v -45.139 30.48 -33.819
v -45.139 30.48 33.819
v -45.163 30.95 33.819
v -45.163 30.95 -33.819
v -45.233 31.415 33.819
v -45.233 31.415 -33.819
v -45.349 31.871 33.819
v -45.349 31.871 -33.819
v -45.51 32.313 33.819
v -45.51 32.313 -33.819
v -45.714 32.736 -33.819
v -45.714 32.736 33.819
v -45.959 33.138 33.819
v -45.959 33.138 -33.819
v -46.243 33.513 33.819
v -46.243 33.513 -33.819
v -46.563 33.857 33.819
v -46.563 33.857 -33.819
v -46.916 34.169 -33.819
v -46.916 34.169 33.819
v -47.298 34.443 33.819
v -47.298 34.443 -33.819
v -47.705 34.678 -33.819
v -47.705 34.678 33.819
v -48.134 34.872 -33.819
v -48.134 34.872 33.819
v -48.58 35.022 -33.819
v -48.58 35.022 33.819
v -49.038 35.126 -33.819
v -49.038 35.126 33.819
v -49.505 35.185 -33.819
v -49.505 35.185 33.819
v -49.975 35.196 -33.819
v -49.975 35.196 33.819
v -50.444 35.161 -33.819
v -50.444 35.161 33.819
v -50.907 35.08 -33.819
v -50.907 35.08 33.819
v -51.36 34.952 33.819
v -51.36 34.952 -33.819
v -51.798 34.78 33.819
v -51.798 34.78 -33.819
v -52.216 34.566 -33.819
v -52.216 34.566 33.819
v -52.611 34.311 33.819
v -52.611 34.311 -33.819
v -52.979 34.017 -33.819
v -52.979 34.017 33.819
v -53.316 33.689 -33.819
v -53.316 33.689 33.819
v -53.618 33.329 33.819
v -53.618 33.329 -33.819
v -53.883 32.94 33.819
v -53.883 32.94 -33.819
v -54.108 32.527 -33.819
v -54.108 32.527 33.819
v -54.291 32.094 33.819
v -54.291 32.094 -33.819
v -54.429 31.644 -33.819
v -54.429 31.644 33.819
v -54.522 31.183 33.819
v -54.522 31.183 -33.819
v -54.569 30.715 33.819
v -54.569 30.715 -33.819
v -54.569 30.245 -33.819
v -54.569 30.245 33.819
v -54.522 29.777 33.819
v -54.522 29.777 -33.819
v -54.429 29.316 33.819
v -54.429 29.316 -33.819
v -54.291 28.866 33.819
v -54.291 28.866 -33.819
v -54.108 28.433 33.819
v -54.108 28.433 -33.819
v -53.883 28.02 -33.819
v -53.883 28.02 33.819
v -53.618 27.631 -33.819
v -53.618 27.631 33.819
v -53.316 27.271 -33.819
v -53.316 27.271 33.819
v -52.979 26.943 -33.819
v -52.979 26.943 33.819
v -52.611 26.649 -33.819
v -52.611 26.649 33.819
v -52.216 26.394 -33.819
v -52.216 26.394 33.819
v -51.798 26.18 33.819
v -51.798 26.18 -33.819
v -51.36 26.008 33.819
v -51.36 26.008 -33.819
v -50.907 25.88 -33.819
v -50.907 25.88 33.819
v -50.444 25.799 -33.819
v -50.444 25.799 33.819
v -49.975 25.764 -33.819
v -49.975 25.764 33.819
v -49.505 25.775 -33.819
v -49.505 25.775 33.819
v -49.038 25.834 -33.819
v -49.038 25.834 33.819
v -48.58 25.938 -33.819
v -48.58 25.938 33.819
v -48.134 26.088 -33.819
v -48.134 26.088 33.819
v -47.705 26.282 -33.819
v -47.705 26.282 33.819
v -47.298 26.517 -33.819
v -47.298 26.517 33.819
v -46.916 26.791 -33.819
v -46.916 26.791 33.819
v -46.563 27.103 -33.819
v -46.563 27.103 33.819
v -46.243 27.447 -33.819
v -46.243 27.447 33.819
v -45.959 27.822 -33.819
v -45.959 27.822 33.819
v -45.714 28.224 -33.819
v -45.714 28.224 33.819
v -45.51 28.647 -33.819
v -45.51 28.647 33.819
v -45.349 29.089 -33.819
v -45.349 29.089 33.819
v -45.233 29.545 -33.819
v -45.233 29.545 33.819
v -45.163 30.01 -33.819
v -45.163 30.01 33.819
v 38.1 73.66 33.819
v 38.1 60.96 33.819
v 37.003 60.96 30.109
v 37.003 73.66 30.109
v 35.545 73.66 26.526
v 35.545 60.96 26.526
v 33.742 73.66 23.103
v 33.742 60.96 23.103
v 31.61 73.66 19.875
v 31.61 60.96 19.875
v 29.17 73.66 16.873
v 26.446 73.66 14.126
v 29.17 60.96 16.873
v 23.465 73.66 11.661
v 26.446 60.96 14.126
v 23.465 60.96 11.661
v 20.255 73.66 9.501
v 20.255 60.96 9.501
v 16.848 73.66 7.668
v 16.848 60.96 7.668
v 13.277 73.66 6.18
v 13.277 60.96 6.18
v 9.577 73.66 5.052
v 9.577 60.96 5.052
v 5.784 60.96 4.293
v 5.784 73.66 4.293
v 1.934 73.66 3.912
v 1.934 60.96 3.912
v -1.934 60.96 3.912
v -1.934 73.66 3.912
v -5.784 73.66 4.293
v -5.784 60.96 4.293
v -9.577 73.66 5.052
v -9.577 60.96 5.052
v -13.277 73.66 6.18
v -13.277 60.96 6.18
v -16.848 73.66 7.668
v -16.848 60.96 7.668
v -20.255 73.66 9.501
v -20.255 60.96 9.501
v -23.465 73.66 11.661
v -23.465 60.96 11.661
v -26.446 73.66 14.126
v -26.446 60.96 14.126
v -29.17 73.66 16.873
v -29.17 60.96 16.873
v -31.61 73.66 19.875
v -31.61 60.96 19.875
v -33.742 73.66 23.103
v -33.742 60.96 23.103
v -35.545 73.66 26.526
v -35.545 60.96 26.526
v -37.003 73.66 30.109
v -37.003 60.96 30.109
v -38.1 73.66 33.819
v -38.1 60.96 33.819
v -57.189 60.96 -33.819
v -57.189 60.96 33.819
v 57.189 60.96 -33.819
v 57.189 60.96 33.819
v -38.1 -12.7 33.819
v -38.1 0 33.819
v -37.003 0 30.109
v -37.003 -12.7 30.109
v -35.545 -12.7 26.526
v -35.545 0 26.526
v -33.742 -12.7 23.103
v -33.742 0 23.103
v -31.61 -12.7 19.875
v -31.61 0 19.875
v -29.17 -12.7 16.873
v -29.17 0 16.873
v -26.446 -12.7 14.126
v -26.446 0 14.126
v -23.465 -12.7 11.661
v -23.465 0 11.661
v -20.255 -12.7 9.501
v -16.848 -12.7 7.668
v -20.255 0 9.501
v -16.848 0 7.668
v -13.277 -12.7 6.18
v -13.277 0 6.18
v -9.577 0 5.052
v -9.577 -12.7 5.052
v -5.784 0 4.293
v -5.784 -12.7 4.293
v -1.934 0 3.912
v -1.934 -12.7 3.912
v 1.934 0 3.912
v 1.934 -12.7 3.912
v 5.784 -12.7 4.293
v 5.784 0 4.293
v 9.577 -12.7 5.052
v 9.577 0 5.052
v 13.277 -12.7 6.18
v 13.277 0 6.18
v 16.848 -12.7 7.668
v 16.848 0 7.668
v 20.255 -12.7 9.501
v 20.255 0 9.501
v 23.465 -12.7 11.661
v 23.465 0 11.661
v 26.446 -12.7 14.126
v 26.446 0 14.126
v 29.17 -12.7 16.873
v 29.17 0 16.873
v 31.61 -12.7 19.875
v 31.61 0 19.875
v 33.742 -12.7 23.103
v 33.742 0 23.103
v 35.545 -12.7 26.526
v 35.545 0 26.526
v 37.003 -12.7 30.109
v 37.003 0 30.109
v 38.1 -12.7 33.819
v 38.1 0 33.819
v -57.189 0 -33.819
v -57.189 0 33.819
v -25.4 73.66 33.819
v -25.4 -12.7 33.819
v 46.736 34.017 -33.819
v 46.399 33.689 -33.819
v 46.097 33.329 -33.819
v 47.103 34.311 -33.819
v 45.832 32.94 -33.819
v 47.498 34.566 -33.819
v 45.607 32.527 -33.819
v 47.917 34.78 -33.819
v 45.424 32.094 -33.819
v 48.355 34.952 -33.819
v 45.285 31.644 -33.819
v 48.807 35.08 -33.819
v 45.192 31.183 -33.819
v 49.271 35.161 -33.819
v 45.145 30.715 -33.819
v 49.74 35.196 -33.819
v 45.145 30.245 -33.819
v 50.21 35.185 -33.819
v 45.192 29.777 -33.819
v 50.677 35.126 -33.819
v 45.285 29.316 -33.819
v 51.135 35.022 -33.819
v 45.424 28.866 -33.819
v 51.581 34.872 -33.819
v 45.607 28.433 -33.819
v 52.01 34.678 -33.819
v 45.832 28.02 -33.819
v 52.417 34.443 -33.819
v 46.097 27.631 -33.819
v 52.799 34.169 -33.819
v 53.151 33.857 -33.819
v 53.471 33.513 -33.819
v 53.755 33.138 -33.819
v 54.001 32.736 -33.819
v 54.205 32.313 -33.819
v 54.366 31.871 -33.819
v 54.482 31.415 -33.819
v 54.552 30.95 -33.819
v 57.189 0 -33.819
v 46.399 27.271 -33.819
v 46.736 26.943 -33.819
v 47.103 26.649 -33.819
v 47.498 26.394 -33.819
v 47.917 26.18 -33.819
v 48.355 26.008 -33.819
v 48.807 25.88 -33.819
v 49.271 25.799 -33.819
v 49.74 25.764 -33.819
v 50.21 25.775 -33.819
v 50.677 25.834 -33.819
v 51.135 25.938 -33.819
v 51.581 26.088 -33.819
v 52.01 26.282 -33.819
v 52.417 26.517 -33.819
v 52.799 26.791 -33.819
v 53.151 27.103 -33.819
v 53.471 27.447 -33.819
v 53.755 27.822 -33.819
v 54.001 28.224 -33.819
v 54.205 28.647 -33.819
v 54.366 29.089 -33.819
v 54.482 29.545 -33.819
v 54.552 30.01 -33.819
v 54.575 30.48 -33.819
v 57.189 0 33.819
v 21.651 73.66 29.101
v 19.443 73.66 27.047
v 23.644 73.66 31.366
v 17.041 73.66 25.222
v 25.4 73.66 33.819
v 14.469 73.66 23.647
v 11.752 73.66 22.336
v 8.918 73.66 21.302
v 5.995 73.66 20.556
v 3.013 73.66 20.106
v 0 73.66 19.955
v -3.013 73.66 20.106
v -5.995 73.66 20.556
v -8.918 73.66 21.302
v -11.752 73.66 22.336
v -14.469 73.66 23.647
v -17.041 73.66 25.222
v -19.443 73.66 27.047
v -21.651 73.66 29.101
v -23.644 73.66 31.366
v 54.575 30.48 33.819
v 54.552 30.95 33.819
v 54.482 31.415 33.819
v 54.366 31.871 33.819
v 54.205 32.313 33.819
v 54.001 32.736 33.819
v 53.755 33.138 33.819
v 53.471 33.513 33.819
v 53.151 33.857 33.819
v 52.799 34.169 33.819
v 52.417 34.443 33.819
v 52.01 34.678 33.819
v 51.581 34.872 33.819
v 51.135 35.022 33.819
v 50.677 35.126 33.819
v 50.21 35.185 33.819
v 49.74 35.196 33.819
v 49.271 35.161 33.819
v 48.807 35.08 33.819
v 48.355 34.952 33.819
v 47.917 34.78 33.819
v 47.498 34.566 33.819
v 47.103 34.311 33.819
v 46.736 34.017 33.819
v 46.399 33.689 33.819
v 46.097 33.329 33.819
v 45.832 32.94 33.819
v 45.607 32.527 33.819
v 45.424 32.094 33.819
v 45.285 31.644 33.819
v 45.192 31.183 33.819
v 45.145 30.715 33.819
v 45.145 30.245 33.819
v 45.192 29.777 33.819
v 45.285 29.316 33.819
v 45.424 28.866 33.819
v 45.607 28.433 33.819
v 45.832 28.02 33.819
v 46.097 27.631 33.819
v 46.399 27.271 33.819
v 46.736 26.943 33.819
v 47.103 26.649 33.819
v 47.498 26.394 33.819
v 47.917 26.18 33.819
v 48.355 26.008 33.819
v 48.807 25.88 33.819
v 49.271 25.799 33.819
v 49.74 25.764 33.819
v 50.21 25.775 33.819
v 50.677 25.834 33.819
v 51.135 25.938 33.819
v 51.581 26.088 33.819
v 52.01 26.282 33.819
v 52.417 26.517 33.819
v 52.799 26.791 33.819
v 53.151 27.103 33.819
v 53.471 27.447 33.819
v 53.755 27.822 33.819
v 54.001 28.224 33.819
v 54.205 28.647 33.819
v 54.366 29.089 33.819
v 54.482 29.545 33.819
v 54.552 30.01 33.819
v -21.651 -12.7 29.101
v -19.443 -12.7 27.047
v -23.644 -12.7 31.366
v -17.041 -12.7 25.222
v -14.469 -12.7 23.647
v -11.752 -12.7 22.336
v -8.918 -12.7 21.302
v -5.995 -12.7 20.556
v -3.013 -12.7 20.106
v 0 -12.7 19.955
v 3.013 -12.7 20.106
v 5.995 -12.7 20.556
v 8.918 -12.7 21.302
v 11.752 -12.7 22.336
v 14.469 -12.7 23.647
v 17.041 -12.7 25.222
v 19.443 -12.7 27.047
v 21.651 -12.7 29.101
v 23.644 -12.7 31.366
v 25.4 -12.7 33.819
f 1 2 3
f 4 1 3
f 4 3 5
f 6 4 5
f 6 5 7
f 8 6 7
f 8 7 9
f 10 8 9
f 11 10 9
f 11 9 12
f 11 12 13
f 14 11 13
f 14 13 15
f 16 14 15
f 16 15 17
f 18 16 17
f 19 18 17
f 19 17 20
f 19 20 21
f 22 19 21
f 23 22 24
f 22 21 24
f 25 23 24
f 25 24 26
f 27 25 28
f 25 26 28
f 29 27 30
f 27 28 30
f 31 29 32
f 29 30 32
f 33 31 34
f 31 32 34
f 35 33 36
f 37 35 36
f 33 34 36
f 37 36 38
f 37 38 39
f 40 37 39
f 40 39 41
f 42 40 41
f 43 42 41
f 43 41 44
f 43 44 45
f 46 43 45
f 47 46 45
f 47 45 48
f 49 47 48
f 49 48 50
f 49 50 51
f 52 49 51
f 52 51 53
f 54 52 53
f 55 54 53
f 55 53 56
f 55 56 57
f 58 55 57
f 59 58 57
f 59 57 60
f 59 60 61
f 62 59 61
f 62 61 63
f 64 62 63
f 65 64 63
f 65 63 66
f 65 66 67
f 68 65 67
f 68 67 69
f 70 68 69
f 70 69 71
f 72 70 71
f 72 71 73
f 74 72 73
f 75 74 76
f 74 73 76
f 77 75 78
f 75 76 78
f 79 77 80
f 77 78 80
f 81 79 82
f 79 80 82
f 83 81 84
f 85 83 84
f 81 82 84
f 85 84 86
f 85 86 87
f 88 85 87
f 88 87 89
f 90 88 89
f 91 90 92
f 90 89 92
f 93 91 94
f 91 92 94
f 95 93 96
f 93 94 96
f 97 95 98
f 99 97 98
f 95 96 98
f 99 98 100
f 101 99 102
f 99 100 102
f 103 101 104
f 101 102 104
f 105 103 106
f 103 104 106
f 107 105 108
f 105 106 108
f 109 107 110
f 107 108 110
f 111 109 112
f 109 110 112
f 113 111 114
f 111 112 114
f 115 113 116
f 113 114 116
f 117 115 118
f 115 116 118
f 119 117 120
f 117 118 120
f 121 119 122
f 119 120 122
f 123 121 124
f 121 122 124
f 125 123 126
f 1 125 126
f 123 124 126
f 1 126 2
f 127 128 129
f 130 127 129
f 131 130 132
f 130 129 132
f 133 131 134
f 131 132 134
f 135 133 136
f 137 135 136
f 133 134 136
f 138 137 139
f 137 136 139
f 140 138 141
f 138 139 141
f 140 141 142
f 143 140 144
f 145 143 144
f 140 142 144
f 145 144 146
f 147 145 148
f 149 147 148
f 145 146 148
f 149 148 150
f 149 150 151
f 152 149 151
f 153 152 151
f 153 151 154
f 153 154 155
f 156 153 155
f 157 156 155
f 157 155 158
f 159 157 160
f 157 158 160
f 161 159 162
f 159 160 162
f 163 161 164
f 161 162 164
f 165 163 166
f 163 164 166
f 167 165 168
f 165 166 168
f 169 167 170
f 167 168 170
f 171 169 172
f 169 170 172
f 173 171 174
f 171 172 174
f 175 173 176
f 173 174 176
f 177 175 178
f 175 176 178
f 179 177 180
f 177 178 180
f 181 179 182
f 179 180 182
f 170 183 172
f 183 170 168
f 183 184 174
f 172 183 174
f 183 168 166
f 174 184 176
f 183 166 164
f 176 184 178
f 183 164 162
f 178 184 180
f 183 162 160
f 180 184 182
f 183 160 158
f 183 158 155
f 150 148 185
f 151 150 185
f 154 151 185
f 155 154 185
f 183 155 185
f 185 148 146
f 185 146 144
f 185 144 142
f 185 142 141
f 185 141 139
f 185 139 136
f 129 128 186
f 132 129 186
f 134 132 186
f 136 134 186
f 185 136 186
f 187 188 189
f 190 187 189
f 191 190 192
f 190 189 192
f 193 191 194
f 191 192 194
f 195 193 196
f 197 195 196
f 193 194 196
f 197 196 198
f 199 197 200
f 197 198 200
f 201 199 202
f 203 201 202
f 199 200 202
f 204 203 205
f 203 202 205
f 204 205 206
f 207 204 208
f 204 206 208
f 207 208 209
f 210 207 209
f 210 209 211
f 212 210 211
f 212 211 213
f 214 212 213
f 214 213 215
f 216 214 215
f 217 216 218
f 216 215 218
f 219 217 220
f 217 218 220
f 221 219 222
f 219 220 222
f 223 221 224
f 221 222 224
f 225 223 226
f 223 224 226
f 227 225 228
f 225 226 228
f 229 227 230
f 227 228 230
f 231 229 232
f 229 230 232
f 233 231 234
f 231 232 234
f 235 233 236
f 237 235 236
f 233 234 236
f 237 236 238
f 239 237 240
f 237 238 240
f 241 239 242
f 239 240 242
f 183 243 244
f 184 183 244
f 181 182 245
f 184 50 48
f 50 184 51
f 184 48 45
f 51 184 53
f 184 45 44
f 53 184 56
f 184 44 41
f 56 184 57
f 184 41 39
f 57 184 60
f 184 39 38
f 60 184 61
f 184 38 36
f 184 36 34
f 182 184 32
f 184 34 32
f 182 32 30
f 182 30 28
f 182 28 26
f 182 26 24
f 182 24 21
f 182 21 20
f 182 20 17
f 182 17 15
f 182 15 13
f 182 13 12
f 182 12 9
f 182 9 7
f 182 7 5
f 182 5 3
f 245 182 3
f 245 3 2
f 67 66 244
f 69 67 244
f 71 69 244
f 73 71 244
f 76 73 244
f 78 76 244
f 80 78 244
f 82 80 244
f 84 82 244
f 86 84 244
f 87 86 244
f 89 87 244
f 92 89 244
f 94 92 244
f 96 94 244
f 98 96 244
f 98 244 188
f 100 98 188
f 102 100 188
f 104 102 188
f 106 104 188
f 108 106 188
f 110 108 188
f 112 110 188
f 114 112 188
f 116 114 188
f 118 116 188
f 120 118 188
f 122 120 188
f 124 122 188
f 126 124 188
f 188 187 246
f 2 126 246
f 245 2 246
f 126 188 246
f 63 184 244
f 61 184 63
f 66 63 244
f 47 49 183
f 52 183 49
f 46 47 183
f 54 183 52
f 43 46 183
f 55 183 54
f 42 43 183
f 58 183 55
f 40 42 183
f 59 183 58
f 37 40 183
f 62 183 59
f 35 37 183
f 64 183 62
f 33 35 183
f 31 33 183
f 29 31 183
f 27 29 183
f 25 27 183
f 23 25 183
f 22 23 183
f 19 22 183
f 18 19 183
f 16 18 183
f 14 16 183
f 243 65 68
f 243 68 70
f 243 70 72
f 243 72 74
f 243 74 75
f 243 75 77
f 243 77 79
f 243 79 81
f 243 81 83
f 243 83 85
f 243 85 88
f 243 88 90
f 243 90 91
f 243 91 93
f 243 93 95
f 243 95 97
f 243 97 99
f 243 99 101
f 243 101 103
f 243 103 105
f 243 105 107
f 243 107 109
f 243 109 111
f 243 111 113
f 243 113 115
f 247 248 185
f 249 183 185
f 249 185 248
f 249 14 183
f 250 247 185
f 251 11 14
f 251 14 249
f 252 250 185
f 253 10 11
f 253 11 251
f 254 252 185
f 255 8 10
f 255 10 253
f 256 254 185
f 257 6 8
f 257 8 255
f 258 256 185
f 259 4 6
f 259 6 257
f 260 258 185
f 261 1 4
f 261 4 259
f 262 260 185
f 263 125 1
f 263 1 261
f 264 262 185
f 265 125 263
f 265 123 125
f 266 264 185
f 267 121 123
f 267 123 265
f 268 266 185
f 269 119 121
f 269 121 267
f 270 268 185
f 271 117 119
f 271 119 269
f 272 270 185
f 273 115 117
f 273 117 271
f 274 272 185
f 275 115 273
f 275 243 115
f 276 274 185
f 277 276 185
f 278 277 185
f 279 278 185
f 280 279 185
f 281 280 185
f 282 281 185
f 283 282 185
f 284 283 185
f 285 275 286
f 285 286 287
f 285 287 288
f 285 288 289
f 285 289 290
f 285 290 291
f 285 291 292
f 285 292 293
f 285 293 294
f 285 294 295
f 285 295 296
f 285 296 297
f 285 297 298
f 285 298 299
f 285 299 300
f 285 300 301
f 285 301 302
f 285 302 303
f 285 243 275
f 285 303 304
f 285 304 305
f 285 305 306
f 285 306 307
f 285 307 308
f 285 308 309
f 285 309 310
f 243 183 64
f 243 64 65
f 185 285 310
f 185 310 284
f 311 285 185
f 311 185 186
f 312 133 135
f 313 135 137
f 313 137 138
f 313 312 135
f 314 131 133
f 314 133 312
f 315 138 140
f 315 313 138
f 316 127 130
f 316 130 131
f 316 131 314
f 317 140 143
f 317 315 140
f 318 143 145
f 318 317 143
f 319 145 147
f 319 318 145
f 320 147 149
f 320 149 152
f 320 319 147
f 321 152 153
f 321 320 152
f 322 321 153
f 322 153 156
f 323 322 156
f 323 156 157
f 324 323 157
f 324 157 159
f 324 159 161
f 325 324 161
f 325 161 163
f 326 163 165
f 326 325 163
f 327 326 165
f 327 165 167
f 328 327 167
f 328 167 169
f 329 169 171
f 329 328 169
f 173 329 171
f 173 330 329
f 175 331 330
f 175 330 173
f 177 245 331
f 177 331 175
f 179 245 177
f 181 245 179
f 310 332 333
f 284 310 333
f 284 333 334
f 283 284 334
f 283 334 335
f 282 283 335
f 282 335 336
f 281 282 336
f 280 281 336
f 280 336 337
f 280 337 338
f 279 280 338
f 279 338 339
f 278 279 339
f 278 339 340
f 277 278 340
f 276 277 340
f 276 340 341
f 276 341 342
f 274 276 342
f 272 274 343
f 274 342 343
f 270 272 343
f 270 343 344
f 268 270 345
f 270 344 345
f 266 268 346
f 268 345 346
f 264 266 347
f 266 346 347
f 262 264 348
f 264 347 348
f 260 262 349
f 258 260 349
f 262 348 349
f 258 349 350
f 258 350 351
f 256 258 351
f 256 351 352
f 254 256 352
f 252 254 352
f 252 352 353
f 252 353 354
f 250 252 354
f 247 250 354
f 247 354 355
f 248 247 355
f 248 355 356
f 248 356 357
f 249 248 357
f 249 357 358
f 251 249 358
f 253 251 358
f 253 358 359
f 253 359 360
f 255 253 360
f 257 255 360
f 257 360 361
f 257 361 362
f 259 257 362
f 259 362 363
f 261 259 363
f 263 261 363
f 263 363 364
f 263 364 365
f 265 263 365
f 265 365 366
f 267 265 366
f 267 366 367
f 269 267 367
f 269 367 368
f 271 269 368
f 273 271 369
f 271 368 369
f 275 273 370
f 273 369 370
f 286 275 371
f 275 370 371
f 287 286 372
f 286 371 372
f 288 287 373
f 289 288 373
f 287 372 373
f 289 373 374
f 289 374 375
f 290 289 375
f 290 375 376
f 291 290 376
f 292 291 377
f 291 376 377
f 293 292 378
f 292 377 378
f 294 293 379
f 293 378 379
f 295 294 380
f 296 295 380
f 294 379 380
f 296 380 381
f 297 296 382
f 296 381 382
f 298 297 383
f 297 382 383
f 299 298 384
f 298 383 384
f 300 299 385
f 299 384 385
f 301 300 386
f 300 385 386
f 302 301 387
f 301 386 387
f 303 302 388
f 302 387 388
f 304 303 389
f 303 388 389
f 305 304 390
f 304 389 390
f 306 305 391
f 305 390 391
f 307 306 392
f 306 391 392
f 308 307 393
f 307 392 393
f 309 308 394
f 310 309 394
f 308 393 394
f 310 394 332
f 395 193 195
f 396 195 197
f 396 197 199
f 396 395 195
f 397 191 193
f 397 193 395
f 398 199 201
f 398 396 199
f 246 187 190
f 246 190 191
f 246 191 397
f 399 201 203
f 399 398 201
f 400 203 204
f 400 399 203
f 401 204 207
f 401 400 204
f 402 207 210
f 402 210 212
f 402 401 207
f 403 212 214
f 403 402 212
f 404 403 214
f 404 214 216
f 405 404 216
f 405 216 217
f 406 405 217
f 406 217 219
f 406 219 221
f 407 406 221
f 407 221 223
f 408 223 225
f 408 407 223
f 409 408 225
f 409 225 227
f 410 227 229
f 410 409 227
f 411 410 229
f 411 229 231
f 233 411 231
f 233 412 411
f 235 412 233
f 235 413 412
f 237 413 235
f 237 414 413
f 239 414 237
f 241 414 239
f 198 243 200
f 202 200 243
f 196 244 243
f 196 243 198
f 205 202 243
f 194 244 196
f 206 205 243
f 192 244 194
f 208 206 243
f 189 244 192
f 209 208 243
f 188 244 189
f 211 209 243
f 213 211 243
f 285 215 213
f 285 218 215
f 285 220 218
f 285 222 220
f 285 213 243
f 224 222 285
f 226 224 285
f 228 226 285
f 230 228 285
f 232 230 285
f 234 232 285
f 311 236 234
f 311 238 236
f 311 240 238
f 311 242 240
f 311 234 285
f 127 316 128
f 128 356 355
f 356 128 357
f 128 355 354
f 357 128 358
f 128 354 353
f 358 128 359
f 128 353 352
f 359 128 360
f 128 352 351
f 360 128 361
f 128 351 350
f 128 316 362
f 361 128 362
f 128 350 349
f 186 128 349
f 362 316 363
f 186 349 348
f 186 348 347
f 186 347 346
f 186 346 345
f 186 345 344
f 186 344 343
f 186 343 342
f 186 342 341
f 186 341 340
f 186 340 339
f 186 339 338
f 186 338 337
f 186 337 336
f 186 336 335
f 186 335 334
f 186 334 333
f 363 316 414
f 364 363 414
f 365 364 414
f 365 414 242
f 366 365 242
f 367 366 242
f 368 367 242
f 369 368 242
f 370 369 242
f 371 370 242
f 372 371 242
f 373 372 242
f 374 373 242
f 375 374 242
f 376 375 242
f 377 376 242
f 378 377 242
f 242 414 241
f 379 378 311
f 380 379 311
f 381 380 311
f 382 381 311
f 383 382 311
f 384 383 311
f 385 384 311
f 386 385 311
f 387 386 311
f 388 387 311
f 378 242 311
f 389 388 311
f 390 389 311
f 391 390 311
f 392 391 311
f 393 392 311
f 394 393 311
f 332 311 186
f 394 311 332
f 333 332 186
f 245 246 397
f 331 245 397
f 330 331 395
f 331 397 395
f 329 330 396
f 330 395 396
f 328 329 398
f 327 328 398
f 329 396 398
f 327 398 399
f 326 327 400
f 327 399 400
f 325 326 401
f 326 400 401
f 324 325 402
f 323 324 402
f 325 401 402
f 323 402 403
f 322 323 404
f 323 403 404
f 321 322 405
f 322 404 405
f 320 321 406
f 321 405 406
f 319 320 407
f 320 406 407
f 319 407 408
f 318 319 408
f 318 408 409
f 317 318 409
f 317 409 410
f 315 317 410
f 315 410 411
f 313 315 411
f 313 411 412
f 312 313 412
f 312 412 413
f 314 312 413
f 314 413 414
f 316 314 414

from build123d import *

# Parameters (mm, degrees)
F0_W     = 114.378564
F0_H     = 67.637316
F1_DEPTH = 60.96
F3_DEPTH = 12.7
F5_DEPTH = 12.7
F7_DEPTH = 86.361
F8_R     = 4.717852
F9_DEPTH = 67.638317


with BuildPart() as f1:
    # F0 (on Front) → F1 (new body)
    with BuildSketch(Plane.XZ):
        Rectangle(F0_W, F0_H)
    extrude(amount=-F1_DEPTH)

    # F2 (on face) → F3 (join)
    with BuildSketch(Plane(origin=(0, 60.96, 0), x_dir=(-1, 0, 0), z_dir=(0, 1, 0))):
        with BuildLine():
            Line((0, 33.818658), (-38.1, 33.818658))
            ThreePointArc((-38.1, 33.818658), (0, 3.86379), (38.1, 33.818658))
            Line((38.1, 33.818658), (0, 33.818658))
        make_face()
    extrude(amount=F3_DEPTH)

    # F4 (on face) → F5 (join)
    with BuildSketch(Plane.XZ):
        with BuildLine():
            ThreePointArc((-38.1, 33.818658), (0, 3.86379), (38.1, 33.818658))
            Line((38.1, 33.818658), (-38.1, 33.818658))
        make_face()
    extrude(amount=F5_DEPTH)

    # F6 (on face) → F7 (cut, through all)
    with BuildSketch(Plane.XZ.offset(12.7)):
        with BuildLine():
            Line((0, 33.818658), (-25.4, 33.818658))
            ThreePointArc((-25.4, 33.818658), (0, 19.955179), (25.4, 33.818658))
            Line((25.4, 33.818658), (0, 33.818658))
        make_face()
    extrude(amount=-F7_DEPTH, mode=Mode.SUBTRACT)

    # F8 (on face) → F9 (cut, through all)
    with BuildSketch(Plane.XY.offset(33.818658)):
        with Locations((-49.857318, 30.48)):
            Circle(F8_R)
        with Locations((49.857318, 30.48)):
            Circle(F8_R)
    extrude(amount=-F9_DEPTH, mode=Mode.SUBTRACT)


solid = f1.part
